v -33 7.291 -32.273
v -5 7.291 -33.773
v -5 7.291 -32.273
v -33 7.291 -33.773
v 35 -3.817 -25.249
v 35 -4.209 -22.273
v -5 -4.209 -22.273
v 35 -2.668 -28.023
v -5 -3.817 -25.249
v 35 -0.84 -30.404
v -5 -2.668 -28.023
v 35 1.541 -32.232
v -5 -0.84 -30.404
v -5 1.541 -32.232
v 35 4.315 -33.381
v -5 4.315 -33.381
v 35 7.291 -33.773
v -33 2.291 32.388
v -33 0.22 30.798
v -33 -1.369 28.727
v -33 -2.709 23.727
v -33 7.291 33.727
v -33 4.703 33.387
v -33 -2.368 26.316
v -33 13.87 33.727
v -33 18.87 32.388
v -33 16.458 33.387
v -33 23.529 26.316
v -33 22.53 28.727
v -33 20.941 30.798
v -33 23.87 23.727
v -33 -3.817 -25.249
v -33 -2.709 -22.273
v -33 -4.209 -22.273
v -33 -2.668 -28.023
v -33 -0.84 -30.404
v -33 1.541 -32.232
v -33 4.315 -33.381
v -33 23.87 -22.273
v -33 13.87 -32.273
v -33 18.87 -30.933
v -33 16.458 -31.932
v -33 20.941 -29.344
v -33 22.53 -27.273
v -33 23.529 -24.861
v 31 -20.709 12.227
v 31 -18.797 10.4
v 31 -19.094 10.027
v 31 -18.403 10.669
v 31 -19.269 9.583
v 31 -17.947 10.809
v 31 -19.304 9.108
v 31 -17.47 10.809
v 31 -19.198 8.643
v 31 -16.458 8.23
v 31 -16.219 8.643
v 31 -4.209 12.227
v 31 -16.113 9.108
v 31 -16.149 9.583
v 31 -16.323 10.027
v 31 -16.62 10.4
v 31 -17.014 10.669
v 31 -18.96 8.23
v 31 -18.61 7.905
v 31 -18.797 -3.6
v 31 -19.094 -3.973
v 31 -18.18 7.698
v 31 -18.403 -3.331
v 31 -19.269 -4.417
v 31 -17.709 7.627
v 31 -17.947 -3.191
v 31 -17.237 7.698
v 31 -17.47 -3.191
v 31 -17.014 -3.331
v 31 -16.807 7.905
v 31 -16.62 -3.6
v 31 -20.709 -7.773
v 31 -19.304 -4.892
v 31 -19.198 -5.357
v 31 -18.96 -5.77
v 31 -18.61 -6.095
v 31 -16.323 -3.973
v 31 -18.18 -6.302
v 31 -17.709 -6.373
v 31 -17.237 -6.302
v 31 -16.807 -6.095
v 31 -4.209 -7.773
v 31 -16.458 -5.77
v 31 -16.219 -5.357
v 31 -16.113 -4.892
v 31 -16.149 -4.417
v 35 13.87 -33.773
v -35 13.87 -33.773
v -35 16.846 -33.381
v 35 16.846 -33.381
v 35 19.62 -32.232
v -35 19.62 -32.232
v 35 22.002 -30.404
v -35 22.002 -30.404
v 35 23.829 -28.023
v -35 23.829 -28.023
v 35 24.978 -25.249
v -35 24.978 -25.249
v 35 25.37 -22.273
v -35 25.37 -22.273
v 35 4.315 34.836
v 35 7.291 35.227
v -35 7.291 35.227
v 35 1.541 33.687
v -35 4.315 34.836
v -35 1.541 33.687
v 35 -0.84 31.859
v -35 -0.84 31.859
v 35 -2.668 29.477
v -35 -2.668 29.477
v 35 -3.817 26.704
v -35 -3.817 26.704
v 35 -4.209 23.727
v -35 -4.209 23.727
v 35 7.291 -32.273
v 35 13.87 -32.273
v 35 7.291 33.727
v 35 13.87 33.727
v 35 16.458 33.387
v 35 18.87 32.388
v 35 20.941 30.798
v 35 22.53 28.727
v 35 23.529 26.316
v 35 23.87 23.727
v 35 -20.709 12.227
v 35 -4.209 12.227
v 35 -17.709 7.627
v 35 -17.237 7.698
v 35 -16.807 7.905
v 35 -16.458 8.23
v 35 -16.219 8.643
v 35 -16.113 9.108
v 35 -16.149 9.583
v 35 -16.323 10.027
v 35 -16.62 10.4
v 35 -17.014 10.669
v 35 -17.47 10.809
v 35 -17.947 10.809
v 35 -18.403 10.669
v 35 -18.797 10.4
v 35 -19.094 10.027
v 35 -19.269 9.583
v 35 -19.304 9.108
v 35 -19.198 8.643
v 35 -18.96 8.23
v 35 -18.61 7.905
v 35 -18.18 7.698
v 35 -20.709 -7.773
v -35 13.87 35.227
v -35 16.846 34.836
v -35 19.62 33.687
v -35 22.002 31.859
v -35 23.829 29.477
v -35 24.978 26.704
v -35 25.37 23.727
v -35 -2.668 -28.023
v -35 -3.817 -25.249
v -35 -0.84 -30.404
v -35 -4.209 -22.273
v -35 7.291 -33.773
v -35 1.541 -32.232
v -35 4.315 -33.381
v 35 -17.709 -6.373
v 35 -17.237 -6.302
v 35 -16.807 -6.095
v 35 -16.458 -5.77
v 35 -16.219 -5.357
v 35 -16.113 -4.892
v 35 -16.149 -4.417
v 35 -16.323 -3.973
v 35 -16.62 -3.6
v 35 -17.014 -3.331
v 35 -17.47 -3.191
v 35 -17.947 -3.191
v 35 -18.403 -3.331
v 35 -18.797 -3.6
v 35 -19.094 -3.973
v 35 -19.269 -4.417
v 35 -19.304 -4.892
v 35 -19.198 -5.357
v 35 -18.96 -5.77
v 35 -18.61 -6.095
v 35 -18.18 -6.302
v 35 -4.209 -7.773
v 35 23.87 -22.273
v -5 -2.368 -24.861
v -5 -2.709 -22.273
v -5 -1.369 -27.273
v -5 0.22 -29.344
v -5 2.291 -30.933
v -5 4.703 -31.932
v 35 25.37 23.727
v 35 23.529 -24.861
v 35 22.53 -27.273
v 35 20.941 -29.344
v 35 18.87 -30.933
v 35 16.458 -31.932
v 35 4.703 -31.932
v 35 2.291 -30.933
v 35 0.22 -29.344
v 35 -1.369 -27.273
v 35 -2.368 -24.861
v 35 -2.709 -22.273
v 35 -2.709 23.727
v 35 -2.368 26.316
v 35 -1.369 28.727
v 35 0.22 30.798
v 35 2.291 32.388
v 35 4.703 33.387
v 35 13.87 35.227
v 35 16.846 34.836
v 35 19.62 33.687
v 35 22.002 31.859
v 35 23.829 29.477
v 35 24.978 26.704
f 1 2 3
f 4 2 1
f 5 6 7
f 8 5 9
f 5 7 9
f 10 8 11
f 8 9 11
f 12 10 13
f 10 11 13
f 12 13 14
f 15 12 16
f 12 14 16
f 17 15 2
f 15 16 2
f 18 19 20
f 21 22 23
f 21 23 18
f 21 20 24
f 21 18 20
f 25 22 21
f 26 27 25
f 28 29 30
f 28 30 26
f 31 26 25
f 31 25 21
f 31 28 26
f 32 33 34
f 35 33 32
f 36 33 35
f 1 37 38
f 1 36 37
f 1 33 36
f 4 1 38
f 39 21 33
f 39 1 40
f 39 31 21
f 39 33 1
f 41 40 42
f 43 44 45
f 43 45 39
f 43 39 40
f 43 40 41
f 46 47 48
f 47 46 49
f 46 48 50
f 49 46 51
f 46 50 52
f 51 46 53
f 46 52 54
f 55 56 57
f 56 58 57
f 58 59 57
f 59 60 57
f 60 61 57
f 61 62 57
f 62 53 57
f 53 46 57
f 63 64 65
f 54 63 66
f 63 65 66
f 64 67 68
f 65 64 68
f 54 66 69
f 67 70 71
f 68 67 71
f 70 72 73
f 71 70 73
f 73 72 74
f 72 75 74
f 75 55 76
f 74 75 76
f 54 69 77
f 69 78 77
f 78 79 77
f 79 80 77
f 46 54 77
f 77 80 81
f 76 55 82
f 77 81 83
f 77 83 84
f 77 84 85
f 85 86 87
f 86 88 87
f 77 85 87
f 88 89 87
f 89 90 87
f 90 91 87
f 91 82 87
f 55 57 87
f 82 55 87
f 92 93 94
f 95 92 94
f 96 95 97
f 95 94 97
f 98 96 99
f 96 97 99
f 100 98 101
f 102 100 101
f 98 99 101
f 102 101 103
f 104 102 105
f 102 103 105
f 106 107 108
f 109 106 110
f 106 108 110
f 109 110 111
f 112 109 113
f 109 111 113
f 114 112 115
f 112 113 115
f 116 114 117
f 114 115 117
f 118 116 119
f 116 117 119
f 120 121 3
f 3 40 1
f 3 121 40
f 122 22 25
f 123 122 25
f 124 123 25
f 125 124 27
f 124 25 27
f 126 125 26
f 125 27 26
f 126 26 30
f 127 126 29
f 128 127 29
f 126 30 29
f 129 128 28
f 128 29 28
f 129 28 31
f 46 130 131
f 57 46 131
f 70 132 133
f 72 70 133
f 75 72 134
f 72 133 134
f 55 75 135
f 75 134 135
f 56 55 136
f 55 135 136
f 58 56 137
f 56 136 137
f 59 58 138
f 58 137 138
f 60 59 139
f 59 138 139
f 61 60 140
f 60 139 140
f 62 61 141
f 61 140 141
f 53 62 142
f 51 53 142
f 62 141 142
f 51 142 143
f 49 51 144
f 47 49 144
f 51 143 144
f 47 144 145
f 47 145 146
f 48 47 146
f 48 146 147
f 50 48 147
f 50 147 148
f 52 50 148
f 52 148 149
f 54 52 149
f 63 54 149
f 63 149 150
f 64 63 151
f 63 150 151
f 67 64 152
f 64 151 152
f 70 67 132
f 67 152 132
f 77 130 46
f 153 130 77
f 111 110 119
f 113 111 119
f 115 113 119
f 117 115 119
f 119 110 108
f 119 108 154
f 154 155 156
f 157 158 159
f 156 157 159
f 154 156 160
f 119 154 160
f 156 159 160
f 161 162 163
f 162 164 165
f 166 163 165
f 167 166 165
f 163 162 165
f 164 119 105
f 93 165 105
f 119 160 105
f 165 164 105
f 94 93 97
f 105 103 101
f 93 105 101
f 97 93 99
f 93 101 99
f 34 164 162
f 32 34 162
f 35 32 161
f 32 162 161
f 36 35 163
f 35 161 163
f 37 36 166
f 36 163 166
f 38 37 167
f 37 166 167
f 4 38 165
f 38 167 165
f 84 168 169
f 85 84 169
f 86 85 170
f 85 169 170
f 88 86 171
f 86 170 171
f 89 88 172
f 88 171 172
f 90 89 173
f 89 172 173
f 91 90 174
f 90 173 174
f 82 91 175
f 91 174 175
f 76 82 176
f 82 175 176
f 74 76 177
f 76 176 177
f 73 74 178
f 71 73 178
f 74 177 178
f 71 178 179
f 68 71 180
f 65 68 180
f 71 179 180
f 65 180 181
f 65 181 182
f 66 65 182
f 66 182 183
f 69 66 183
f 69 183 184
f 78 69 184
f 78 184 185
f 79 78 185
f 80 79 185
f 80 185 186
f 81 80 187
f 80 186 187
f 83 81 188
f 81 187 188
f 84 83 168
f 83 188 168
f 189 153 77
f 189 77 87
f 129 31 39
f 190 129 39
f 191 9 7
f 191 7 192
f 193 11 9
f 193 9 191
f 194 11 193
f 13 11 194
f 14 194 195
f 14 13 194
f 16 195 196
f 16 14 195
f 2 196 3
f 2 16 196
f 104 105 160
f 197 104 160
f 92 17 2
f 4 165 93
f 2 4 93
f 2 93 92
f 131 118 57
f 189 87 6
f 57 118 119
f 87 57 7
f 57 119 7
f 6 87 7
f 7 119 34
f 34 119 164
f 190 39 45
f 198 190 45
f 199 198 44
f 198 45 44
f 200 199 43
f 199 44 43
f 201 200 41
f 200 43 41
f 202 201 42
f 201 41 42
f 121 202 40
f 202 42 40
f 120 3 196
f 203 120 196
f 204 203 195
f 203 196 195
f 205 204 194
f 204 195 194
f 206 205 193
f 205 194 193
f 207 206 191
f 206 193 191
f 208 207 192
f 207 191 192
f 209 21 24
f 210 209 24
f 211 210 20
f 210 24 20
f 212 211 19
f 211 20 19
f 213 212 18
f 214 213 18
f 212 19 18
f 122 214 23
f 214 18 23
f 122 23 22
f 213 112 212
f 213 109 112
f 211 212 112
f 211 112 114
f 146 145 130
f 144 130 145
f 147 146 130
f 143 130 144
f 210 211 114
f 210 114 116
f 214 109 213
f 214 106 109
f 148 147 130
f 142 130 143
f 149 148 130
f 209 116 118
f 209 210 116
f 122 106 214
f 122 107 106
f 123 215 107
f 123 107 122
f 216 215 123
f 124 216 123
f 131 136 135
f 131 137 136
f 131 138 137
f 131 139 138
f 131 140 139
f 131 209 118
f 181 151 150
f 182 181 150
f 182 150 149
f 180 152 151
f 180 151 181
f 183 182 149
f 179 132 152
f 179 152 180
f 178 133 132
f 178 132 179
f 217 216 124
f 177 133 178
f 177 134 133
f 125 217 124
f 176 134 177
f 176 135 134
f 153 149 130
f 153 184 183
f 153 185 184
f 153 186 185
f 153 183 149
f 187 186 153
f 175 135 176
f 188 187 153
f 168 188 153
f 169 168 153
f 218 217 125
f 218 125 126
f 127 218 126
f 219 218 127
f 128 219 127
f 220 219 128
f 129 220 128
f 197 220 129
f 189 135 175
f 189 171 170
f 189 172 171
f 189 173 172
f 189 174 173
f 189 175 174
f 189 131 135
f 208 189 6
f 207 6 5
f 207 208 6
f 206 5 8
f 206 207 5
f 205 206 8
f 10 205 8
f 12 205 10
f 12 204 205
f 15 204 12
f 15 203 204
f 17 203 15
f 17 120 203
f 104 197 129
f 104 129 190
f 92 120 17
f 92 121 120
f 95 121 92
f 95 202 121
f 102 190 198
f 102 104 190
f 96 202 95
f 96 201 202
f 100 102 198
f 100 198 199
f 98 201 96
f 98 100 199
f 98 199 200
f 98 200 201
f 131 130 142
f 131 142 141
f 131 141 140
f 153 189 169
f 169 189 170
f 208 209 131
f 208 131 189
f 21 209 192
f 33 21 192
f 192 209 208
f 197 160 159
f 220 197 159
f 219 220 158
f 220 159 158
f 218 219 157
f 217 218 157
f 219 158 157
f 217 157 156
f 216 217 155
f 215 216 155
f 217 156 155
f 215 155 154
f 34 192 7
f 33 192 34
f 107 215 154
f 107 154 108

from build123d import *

# Parameters (mm, degrees)
EXTRUDE_2_DEPTH     = 70
EXTRUDE_3_DEPTH     = 2
SKETCH_7_W          = 20
SKETCH_7_H          = 18
SKETCH_7_R          = 1.6
EXTRUDE_5_DEPTH     = 4
SKETCH_8_W          = 28
SKETCH_8_H          = 11.5
CUT_EXTRUDE_2_DEPTH = 11.5


with BuildPart() as part:
    # 草图1 → 凸台-拉伸2 (new body)
    with BuildSketch(Plane.ZY.offset(35)):
        with BuildLine():
            Line((23.72736994, 25.369984756), (-22.27263006, 25.369984756))
            ThreePointArc((-22.27263006, 25.369984756), (-30.404358044, 22.001712739), (-33.77263006, 13.869984756))
            Line((-33.77263006, 13.869984756), (-33.77263006, 7.291341901))
            ThreePointArc((-33.77263006, 7.291341901), (-30.404358044, -0.840386083), (-22.27263006, -4.208658099))
            Line((-22.27263006, -4.208658099), (23.72736994, -4.208658099))
            ThreePointArc((23.72736994, -4.208658099), (31.859097923, -0.840386083), (35.22736994, 7.291341901))
            Line((35.22736994, 7.291341901), (35.22736994, 13.869984756))
            ThreePointArc((35.22736994, 13.869984756), (31.859097923, 22.001712739), (23.72736994, 25.369984756))
        make_face()
        with BuildLine():
            ThreePointArc((-32.27263006, 13.869984756), (-29.343697872, 20.941052568), (-22.27263006, 23.869984756))
            Line((-22.27263006, 23.869984756), (23.72736994, 23.869984756))
            ThreePointArc((23.72736994, 23.869984756), (30.798437752, 20.941052568), (33.72736994, 13.869984756))
            Line((33.72736994, 13.869984756), (33.72736994, 7.291341901))
            ThreePointArc((33.72736994, 7.291341901), (30.798437752, 0.220274089), (23.72736994, -2.708658099))
            Line((23.72736994, -2.708658099), (-22.27263006, -2.708658099))
            ThreePointArc((-22.27263006, -2.708658099), (-29.343697872, 0.220274089), (-32.27263006, 7.291341901))
            Line((-32.27263006, 7.291341901), (-32.27263006, 13.869984756))
        make_face(mode=Mode.SUBTRACT)
    extrude(amount=-EXTRUDE_2_DEPTH)

    # 草图1<4> → 凸台-拉伸3 (add)
    with BuildSketch(Plane.ZY.offset(35)):
        with BuildLine():
            Line((-22.27263006, 23.869984756), (23.72736994, 23.869984756))
            ThreePointArc((23.72736994, 23.869984756), (30.798437752, 20.941052568), (33.72736994, 13.869984756))
            Line((33.72736994, 13.869984756), (33.72736994, 7.291341901))
            ThreePointArc((33.72736994, 7.291341901), (30.798437752, 0.220274089), (23.72736994, -2.708658099))
            Line((23.72736994, -2.708658099), (-22.27263006, -2.708658099))
            ThreePointArc((-22.27263006, -2.708658099), (-29.343697872, 0.220274089), (-32.27263006, 7.291341901))
            Line((-32.27263006, 7.291341901), (-32.27263006, 13.869984756))
            ThreePointArc((-32.27263006, 13.869984756), (-29.343697872, 20.941052568), (-22.27263006, 23.869984756))
        make_face()
    extrude(amount=-EXTRUDE_3_DEPTH)

    # 草图7 → 凸台-拉伸5 (add)
    with BuildSketch(Plane(origin=(35, 0, 0), x_dir=(0, 0, -1), z_dir=(1, 0, 0))):
        with Locations((-2.22736994, -11.708658099)):
            Rectangle(SKETCH_7_W, SKETCH_7_H)
        with Locations((4.77263006, -17.708658099)):
            Circle(SKETCH_7_R, mode=Mode.SUBTRACT)
        with Locations((-9.22736994, -17.708658099)):
            Circle(SKETCH_7_R, mode=Mode.SUBTRACT)
    extrude(amount=-EXTRUDE_5_DEPTH)

    # 草图8 → 切除-拉伸2 (cut)
    with BuildSketch(Plane(origin=(0, 0, -33.77263006), x_dir=(-1, 0, 0), z_dir=(0, 0, -1))):
        with Locations((19, 1.541341901)):
            Rectangle(SKETCH_8_W, SKETCH_8_H)
    extrude(amount=-CUT_EXTRUDE_2_DEPTH, mode=Mode.SUBTRACT)


solid = part.part
